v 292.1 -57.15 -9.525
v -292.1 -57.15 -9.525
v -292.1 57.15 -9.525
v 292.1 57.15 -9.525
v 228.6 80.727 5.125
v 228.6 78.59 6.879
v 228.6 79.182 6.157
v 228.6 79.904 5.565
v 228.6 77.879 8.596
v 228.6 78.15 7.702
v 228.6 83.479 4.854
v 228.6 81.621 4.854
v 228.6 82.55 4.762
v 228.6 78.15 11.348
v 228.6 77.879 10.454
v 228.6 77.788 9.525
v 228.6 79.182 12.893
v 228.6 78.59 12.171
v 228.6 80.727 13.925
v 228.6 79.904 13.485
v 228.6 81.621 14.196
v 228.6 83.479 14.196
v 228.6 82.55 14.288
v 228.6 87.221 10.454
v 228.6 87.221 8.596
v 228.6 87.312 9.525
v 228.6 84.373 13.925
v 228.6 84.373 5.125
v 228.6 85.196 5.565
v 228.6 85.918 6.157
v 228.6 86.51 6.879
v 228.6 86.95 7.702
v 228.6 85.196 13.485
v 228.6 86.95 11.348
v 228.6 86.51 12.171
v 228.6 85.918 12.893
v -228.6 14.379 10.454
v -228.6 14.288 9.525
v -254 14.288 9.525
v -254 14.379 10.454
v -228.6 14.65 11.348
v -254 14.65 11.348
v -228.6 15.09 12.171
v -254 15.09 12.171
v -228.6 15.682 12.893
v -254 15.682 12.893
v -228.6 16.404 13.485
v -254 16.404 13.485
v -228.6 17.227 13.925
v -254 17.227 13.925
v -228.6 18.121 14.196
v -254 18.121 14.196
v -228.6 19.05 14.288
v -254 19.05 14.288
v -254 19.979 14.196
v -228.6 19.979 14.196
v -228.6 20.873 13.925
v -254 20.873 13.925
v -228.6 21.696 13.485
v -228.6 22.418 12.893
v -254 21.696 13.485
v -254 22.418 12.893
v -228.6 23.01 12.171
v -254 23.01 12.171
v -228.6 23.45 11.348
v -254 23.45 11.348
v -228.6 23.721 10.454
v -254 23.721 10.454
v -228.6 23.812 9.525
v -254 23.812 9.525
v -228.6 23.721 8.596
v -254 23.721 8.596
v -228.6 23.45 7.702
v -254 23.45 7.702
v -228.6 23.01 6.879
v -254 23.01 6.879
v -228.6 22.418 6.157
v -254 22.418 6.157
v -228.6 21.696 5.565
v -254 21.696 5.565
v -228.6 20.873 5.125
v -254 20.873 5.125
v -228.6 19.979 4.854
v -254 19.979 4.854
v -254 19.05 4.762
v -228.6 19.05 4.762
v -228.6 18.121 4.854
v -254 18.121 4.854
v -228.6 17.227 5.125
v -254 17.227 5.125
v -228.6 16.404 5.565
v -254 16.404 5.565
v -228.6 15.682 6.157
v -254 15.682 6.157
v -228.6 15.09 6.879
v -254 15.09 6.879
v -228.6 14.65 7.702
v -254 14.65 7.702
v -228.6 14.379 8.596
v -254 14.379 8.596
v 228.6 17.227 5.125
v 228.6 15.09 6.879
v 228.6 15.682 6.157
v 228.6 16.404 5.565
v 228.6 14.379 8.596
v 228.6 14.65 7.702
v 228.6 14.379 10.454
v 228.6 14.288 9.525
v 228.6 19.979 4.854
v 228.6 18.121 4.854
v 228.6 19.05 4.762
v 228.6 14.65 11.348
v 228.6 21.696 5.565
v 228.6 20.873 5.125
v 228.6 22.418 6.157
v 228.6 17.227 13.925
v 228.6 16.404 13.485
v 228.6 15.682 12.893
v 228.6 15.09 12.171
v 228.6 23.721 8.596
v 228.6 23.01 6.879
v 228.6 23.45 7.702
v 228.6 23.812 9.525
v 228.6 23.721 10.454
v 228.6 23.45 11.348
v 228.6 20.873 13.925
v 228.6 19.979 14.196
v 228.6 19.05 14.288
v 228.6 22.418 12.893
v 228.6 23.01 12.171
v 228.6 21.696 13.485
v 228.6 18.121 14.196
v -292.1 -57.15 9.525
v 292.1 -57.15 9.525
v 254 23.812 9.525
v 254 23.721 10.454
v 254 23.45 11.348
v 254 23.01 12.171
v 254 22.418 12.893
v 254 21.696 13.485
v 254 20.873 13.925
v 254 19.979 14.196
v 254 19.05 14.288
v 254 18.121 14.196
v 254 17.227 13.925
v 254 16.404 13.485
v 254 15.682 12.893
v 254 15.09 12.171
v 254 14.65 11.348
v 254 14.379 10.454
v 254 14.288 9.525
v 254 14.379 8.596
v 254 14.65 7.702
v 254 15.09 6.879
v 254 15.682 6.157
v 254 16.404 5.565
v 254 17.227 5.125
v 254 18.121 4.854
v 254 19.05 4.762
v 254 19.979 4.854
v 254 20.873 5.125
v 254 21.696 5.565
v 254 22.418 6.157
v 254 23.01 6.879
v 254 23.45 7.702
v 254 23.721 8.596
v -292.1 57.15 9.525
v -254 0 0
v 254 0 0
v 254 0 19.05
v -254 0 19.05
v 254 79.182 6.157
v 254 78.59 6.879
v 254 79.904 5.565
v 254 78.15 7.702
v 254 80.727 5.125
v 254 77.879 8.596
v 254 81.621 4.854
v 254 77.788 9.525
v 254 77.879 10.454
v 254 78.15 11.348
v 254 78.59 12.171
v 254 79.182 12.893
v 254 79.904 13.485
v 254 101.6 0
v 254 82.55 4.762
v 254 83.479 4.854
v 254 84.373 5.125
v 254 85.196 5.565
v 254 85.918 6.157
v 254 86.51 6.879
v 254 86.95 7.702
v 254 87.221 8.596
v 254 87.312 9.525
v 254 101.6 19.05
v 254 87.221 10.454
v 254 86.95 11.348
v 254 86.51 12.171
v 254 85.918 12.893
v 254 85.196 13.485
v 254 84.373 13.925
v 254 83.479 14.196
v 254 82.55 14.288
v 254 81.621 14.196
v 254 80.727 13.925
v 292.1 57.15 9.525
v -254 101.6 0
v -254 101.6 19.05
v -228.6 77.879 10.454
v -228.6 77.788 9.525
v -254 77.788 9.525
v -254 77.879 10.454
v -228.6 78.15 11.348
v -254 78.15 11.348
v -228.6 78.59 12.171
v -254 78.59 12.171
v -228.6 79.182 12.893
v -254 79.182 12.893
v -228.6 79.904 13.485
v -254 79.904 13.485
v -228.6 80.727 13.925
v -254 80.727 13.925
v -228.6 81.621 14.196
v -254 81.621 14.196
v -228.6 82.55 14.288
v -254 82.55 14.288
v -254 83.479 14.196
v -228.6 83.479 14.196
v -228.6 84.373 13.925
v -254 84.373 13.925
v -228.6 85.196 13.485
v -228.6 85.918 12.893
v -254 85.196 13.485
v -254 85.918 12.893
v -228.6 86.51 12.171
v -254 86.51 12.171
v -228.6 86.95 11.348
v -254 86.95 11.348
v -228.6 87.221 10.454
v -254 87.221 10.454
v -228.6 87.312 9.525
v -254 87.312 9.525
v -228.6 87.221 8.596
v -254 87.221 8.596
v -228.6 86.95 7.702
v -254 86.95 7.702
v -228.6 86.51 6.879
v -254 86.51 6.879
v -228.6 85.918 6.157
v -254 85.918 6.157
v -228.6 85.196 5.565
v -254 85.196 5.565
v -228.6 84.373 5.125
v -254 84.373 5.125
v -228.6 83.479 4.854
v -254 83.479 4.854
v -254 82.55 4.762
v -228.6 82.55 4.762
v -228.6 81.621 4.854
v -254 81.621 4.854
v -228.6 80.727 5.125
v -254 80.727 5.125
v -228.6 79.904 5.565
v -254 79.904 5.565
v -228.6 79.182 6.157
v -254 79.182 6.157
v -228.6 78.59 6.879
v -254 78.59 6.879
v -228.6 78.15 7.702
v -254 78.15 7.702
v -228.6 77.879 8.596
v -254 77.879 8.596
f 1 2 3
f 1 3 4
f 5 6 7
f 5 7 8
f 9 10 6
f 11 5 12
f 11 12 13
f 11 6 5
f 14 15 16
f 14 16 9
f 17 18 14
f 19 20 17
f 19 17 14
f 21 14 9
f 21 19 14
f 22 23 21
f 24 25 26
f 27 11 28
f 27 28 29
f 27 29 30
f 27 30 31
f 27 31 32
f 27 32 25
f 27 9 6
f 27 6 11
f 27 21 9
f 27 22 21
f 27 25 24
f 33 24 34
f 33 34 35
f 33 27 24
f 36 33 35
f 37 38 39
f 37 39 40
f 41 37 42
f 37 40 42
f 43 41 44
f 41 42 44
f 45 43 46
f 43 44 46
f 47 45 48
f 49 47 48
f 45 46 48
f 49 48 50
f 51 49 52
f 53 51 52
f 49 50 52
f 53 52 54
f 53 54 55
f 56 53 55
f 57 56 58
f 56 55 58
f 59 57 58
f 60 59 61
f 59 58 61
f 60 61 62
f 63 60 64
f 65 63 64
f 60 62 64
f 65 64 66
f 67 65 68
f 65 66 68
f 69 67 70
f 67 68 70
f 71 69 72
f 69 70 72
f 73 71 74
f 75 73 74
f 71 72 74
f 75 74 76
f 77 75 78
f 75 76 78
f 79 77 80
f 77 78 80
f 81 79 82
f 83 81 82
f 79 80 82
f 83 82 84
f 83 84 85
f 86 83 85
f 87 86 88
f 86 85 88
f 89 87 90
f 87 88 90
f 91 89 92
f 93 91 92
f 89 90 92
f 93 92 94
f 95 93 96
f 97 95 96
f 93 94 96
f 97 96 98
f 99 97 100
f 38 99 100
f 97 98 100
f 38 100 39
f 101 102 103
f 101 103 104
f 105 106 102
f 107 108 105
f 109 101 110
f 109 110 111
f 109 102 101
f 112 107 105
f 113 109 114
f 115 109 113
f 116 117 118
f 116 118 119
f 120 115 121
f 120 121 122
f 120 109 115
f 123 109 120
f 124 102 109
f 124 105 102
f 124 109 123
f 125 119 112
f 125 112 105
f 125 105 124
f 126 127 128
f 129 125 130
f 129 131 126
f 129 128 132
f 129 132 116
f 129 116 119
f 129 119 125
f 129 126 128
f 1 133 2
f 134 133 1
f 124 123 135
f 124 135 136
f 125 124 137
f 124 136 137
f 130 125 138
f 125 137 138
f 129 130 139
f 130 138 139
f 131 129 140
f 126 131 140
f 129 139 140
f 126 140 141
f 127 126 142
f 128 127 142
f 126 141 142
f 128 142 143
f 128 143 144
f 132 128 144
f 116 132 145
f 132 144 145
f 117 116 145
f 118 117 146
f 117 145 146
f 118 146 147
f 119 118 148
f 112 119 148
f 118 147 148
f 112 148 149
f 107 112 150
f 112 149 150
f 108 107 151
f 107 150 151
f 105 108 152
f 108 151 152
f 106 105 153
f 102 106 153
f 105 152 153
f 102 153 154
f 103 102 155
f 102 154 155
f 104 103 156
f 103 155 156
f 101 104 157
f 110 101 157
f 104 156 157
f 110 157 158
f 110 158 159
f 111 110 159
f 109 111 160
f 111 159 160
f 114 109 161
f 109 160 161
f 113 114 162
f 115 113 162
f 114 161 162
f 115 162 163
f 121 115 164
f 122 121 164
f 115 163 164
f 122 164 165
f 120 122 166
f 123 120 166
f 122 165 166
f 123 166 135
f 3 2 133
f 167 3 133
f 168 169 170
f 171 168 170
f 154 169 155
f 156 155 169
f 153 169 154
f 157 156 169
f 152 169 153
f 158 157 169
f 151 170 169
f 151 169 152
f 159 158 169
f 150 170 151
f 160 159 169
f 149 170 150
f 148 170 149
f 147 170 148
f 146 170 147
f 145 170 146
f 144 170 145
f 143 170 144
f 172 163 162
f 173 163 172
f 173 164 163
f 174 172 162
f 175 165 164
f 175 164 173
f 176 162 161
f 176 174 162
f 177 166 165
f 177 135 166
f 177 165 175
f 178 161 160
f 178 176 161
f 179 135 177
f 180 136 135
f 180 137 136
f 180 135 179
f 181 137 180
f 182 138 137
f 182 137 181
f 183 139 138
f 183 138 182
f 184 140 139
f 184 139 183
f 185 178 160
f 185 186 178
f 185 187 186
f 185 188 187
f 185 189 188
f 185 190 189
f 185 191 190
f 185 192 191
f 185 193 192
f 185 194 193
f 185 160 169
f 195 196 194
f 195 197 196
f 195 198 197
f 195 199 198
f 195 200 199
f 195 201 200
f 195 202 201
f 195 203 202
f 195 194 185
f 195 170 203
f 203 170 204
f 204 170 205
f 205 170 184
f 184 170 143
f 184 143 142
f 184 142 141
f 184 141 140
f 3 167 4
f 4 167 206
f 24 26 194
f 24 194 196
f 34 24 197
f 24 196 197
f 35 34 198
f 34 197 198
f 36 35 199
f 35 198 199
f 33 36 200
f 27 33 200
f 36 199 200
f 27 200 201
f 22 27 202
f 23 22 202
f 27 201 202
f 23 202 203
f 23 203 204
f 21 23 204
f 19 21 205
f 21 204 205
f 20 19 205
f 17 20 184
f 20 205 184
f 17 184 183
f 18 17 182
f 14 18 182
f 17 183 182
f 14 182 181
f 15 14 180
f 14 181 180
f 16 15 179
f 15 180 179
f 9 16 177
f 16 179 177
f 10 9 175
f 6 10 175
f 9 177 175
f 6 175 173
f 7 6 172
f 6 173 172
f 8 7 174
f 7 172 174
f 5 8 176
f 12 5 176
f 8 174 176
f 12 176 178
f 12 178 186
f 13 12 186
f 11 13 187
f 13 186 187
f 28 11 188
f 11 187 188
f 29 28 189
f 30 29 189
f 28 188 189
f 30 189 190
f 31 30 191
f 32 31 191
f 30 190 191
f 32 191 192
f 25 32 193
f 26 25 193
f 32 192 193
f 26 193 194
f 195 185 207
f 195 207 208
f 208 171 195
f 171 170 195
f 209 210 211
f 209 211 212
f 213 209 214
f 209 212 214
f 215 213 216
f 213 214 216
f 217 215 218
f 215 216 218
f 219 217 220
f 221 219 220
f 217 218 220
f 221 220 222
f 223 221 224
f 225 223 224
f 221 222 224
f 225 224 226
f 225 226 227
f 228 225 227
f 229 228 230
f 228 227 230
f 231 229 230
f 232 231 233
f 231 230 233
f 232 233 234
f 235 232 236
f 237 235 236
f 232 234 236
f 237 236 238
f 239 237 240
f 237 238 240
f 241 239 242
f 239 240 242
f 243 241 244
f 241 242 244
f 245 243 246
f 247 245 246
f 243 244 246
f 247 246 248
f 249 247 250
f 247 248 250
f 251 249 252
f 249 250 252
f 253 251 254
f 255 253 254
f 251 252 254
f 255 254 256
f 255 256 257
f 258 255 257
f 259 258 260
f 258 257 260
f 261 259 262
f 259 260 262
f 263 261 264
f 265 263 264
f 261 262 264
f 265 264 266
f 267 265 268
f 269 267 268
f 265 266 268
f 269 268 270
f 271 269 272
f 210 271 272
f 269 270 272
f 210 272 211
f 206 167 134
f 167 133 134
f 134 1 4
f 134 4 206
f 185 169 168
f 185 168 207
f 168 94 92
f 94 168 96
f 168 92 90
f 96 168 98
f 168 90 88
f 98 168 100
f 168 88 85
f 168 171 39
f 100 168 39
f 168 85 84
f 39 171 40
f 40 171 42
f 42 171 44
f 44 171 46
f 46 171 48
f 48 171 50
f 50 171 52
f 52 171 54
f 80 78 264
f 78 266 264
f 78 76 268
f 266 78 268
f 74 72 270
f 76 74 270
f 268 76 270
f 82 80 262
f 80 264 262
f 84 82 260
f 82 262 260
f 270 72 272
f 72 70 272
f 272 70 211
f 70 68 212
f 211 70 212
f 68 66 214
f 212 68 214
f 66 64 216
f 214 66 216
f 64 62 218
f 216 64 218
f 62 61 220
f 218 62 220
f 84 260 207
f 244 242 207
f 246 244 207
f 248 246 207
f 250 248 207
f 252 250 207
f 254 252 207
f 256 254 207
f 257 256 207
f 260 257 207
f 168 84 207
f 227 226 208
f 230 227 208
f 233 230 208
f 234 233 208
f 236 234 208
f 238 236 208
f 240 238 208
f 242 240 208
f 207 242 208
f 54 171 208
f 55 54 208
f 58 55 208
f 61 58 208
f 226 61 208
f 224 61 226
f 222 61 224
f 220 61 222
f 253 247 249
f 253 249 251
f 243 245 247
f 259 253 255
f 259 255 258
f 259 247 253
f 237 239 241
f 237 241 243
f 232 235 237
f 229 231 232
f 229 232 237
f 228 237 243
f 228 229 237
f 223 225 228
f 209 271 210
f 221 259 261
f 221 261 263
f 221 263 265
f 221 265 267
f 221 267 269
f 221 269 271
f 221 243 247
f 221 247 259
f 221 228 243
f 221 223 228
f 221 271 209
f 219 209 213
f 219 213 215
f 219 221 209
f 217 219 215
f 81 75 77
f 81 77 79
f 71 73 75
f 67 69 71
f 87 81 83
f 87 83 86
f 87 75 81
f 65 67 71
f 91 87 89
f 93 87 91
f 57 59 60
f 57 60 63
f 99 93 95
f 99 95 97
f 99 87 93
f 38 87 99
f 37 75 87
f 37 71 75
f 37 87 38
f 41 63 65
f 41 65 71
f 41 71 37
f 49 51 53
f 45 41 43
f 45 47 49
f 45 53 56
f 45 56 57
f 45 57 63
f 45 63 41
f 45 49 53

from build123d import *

# Parameters (mm, degrees)
F0_W     = 101.6
F0_H     = 19.05
F1_DEPTH = 254
F2_R     = 4.7625
F3_DEPTH = 25.4
F4_R     = 4.7625
F5_DEPTH = 25.4
F6_W     = 584.2
F6_H     = 19.05
F7_DEPTH = 57.15


with BuildPart() as f1:
    # F0 (on Right) → F1 (new body, symmetric)
    with BuildSketch(Plane.YZ):
        with Locations((50.8, 9.525)):
            Rectangle(F0_W, F0_H)
    extrude(amount=F1_DEPTH, both=True)

    # F2 (on face) → F3 (cut)
    with BuildSketch(Plane.YZ.offset(254)):
        with Locations((19.05, 9.525)):
            Circle(F2_R)
        with Locations((82.55, 9.525)):
            Circle(F2_R)
    extrude(amount=-F3_DEPTH, mode=Mode.SUBTRACT)

    # F4 (on face) → F5 (cut)
    with BuildSketch(Plane(origin=(-254, 0, 0), x_dir=(0, -1, 0), z_dir=(-1, 0, 0))):
        with Locations((-82.55, 9.525)):
            Circle(F4_R)
        with Locations((-19.05, 9.525)):
            Circle(F4_R)
    extrude(amount=-F5_DEPTH, mode=Mode.SUBTRACT)


with BuildPart() as f7:
    # F6 (on Front) → F7 (new body, symmetric)
    with BuildSketch(Plane.XZ):
        Rectangle(F6_W, F6_H)
    extrude(amount=F7_DEPTH, both=True)


solid = Compound([f1.part, f7.part])
